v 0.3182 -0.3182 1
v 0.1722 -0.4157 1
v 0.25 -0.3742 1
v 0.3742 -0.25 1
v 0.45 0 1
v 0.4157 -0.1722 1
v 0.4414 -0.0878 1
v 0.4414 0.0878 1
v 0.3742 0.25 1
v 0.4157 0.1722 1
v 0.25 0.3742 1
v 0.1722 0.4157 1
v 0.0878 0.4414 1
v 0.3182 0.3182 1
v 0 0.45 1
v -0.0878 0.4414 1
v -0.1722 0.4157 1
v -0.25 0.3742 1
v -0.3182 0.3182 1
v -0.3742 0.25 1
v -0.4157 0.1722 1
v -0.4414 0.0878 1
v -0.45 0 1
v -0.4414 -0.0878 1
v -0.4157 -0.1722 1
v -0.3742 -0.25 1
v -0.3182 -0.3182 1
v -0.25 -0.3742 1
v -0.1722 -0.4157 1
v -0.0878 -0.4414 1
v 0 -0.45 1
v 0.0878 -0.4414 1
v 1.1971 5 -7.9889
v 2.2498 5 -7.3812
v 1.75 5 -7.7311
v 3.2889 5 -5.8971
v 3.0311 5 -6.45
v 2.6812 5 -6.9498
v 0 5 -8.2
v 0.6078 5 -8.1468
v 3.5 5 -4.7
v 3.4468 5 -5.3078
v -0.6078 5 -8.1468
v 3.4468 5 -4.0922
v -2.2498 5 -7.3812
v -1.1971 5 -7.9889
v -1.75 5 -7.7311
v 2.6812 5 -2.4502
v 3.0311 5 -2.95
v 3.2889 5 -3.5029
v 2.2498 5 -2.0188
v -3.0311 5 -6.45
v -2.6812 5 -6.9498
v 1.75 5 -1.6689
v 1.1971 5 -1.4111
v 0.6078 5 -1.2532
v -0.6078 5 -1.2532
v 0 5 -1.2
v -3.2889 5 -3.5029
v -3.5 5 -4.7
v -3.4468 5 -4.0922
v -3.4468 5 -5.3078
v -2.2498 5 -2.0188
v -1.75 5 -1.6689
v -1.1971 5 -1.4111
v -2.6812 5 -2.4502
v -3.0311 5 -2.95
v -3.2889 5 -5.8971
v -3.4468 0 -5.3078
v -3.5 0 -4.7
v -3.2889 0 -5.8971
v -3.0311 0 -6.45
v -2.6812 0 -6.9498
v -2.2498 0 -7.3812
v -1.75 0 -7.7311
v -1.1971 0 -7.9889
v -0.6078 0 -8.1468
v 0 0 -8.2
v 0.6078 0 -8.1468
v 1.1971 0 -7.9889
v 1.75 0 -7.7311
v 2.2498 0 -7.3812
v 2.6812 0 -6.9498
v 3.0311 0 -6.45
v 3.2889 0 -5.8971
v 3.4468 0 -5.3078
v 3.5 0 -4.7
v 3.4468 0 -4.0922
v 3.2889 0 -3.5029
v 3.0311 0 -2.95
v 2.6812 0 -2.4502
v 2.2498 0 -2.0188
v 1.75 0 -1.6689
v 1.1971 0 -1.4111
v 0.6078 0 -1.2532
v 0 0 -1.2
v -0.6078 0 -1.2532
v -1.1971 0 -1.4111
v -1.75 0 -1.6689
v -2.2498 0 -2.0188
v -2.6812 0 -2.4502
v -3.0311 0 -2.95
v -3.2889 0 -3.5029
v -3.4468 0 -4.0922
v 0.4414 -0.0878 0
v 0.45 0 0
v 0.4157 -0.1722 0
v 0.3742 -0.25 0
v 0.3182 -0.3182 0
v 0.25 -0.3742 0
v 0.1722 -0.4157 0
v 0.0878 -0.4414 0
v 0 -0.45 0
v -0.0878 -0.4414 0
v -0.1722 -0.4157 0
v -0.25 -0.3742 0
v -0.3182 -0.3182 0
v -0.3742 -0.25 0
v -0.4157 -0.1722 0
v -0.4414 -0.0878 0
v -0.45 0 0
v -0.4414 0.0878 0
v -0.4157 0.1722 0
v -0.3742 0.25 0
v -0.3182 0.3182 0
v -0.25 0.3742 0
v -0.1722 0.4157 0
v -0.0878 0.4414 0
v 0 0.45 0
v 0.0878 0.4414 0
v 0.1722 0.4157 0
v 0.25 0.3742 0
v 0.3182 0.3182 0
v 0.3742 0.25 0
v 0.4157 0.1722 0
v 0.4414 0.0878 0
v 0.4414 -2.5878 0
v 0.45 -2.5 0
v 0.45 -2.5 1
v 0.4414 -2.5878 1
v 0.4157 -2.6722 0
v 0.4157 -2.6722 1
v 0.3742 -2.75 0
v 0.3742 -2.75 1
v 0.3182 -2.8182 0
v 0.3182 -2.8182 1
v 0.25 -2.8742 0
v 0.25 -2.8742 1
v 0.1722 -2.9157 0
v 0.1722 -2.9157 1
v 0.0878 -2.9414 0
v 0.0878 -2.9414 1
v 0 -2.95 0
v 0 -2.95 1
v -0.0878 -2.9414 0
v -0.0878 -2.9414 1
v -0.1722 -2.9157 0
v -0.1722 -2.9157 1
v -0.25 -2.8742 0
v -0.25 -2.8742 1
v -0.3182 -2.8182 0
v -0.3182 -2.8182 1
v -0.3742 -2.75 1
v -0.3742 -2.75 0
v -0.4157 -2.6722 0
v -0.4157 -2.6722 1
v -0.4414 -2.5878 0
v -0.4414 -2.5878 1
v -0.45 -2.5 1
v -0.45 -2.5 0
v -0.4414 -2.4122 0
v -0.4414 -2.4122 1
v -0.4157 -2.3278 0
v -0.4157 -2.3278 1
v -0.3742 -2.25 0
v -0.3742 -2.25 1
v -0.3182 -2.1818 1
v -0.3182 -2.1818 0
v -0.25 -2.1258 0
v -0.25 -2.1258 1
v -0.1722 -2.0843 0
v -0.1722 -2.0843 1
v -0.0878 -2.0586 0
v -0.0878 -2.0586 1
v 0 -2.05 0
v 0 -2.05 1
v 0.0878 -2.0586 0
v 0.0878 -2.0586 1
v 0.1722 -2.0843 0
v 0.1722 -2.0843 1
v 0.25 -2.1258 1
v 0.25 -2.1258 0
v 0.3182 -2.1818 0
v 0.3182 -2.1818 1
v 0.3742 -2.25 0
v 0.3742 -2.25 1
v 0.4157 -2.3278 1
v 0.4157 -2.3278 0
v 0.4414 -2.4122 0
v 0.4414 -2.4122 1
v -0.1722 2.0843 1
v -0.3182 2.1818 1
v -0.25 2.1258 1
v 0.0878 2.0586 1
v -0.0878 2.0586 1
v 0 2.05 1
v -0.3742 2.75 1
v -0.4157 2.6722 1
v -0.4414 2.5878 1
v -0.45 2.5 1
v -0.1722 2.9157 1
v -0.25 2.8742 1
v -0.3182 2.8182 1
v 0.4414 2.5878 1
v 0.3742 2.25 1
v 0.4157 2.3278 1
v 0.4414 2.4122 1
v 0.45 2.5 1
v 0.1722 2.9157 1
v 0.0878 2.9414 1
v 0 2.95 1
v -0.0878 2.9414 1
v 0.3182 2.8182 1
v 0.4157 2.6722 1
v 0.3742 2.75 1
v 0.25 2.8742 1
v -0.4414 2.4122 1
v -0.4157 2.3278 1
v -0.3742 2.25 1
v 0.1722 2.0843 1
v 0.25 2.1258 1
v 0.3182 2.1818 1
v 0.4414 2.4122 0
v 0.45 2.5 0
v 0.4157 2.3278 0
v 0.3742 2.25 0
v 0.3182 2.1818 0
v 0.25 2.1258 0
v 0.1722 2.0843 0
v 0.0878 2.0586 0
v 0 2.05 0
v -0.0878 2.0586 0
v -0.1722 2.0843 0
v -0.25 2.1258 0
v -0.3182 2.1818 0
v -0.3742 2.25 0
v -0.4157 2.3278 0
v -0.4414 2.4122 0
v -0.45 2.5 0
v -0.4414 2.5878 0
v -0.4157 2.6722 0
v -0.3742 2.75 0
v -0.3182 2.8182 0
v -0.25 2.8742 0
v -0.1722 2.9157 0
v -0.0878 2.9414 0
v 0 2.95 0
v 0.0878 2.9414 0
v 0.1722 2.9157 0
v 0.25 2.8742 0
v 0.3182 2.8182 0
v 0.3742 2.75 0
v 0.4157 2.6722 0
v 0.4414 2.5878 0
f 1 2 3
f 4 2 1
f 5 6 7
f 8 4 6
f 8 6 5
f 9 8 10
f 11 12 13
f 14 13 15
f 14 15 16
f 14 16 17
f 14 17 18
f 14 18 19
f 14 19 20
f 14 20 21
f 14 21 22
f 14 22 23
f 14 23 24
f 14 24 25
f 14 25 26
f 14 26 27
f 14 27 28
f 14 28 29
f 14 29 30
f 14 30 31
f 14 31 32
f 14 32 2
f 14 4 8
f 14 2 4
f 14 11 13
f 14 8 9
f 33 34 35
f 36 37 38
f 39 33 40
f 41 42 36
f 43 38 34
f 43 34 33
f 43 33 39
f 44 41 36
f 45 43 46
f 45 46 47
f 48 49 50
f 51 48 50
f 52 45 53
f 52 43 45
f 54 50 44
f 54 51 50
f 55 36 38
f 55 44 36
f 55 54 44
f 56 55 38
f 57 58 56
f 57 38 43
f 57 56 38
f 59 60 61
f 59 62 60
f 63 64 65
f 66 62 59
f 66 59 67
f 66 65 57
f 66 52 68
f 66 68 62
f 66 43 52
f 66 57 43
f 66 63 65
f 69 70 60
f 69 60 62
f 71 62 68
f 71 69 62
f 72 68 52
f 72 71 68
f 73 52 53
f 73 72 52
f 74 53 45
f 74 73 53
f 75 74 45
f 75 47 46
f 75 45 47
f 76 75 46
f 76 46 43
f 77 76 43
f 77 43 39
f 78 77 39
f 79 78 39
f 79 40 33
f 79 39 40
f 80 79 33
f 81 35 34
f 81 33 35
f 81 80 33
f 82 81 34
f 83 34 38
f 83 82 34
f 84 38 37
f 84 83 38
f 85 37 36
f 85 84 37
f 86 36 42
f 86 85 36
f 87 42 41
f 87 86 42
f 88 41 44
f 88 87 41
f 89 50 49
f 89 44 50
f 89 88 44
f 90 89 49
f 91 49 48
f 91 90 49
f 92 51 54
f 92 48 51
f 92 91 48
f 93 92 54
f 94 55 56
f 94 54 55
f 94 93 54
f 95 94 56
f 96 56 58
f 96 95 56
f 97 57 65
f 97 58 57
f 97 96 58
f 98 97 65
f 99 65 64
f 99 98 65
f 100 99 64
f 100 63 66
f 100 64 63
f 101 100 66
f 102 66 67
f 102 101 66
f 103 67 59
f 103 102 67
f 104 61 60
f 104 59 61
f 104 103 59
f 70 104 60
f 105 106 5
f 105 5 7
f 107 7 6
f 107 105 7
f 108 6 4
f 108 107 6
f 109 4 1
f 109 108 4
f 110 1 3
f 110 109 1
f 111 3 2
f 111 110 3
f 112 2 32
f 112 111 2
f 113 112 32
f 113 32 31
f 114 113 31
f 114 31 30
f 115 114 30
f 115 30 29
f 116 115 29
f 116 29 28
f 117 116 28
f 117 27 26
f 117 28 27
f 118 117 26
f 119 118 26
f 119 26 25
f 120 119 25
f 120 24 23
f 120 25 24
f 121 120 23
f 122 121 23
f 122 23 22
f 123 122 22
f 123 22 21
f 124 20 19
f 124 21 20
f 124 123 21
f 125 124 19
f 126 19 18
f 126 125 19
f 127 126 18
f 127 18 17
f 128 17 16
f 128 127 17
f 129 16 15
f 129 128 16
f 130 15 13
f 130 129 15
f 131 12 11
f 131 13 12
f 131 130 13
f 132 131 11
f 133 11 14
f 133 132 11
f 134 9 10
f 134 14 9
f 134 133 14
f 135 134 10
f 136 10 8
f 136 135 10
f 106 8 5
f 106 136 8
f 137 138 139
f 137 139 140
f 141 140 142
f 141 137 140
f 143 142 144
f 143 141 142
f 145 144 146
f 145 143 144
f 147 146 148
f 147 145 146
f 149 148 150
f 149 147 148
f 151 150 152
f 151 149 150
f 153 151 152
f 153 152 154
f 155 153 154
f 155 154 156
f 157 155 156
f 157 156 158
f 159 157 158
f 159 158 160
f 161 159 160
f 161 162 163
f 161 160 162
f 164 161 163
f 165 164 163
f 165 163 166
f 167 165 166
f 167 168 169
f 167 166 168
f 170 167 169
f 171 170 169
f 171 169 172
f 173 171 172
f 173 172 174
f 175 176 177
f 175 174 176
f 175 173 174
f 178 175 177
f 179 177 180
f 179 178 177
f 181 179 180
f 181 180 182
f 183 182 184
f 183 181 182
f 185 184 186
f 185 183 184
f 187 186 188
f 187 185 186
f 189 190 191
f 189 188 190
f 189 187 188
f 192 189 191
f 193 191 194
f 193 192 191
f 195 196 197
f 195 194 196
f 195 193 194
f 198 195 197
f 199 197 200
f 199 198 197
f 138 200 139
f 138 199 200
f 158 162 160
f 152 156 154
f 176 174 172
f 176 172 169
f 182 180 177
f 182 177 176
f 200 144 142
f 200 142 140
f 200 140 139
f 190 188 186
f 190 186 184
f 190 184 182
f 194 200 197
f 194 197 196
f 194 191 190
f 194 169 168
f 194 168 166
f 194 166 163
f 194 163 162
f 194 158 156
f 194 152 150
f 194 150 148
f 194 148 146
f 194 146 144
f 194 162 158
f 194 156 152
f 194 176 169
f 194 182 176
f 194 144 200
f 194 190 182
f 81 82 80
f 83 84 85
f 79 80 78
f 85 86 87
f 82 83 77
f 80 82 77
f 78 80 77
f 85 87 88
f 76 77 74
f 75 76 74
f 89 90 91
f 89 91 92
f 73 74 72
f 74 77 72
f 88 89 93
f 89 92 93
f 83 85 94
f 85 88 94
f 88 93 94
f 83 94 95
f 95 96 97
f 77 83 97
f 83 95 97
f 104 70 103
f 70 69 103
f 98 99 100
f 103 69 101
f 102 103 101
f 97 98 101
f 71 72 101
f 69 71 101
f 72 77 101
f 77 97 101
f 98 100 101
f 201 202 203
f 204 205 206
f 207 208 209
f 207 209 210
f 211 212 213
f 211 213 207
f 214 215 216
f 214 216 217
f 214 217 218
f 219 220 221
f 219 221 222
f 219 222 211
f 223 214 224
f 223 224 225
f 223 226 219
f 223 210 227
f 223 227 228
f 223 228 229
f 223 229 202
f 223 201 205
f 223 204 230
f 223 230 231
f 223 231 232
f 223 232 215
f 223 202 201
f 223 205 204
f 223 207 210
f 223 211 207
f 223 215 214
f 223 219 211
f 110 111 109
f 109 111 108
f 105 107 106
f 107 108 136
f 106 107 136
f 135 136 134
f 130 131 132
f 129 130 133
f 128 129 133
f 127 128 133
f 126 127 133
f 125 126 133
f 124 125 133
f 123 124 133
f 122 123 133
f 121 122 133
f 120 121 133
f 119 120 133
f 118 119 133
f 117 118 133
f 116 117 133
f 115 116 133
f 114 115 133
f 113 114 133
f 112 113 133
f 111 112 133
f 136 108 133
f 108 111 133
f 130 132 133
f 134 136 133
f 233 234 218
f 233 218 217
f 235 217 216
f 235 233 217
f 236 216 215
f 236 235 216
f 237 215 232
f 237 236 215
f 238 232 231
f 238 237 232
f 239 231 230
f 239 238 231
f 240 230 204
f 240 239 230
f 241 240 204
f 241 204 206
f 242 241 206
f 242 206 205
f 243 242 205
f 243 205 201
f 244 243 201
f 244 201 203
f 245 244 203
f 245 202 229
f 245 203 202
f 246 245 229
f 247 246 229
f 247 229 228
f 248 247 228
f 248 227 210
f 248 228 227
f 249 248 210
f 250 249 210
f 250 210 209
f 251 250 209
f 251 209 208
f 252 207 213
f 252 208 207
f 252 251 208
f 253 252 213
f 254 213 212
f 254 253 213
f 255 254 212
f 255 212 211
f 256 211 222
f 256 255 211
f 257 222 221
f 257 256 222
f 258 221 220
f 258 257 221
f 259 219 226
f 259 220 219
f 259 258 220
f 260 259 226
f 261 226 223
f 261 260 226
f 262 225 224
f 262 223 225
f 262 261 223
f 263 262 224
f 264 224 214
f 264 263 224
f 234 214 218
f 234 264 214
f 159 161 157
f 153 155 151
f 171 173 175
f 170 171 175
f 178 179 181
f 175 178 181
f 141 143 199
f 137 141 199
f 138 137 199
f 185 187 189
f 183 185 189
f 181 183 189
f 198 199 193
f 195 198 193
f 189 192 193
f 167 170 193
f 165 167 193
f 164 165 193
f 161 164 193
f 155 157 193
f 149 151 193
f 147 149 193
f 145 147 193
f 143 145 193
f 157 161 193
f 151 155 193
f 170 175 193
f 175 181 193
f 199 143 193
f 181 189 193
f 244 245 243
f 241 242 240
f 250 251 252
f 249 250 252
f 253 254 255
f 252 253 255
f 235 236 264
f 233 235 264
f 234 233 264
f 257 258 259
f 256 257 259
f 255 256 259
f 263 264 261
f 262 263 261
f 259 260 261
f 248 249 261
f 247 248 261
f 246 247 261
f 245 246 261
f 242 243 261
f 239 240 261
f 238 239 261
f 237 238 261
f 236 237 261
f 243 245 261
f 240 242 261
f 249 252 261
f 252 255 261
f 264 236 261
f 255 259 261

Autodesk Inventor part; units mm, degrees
ref_plane "YZ Plane" through (0, 0, 0) normal (1, 0, 0) x (0, 1, 0)
ref_plane "XZ Plane" through (0, 0, 0) normal (0, 1, 0) x (-1, 0, 0)
ref_plane "XY Plane" through (0, 0, 0) normal (0, 0, 1) x (1, 0, 0)
sketch "Sketch1" plane through (0, 0, 0) normal (0, 0, 1) x (1, 0, 0)
  circle A0 centre (0, 2.5) radius 0.45
  circle A1 centre (0, -2.5) radius 0.45
  circle A2 centre (0, 0) radius 0.45
  dimension "d1" = 0.9
  dimension "d2" = 0.9
  dimension "d3" = 0.9
  dimension "d4" = 2.5
  dimension "d5" = 2.5
extrude "Extrusion1" add sketch "Sketch1" along normal blind 1
sketch "Sketch2" plane through (0, 0, 0) normal (0, 1, 0) x (-1, 0, 0)
  circle A0 centre (0, -4.7) radius 3.5
  line L0 (-0.45, 0) -> (0.45, 0) projected
  point P0 (0, 0)
  dimension "d8" = 7
  dimension "d9" = 4.7
extrude "Extrusion2" add sketch "Sketch2" along normal blind 5
properties part number "On-off pushbutton"
